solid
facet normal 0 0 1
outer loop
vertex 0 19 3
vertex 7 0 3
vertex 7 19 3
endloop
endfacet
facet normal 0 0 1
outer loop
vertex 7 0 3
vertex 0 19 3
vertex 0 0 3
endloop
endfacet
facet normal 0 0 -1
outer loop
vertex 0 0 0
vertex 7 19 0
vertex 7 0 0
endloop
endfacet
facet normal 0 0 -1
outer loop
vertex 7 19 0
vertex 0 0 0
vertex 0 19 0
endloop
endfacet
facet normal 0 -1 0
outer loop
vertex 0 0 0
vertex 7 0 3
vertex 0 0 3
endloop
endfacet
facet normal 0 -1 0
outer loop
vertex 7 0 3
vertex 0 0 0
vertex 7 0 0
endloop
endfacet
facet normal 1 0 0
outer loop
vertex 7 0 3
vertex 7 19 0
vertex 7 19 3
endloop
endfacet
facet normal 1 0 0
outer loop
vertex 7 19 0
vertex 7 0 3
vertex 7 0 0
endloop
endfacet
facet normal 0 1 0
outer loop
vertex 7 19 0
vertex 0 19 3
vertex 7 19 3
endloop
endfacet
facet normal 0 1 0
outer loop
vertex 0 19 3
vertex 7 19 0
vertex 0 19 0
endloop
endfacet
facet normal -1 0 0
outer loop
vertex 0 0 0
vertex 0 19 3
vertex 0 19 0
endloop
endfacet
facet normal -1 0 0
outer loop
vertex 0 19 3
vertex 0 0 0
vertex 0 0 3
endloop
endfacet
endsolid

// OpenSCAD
// Generated by SolidPython 1.0.1 on 2020-07-29 00:46:55


cube(size = [7, 19, 3]);
/***********************************************
*********      SolidPython code:      **********
************************************************
 
# import packages: SolidPython
from solid import *
from solid.utils import *
from itertools import chain, combinations, permutations


class Resize:

    def __init__(self, scad_file):
        self.scad_file = scad_file
        #self.scad_file = import_scad(scad_file)
        # cone/cylinder param:
        self.r1 = 0
        self.r2 = 0
        self.h = 0
        # rectangular prism param:
        self.w = 0
        self.l = 0
        # ellipse param:
        self.r = 0

    # import OpenScad code (file name corresponds to shape)


    # classify shape + parameters
    def assign(self, param1, param2, param3):
        if self.scad_file == 'cone.scad':
            self.r1 = param1
            self.r2 = param2
            self.h = param3
        elif self.scad_file == 'cylinder.scad':
            self.r1 = param1
            self.r2 = param2
            self.h = param3
        elif self.scad_file == 'rectangularPrism.scad':
            self.h = param1
            self.l = param2
            self.w = param3
        else:
            self.r = param1
            self.h = param2

    # resize parameters
    def iterate(self):
        x = range(3, 20, 2)
        i = 1
        if self.scad_file == 'cone.scad':
            tempList = list(permutations(x, 2))
            for temp in tempList:
                param1 = temp[0]
                param2 = temp[1]
                filepath = 'produced_scad_files/' + 'cone' + str(param1) + '_' + str(param2) + '_' + '.scad'
                scad_render_to_file(cylinder(h=param1, r1=param2, r2=0), filepath)

        elif self.scad_file == 'cylinder.scad':
            tempList = list(permutations(x, 3))
            for temp in tempList:
                param1 = temp[0]
                param2 = temp[1]
                filepath = 'produced_scad_files/' + 'cylinder' + str(param1) + '_' + str(param2) + '_' + '.scad'
                scad_render_to_file(cylinder(h=param1, r1=param2, r2=param2), filepath)

        elif self.scad_file == 'rectangularPrism.scad':
            tempList = list(permutations(x, 3))
            for temp in tempList:
                param1 = temp[0]
                param2 = temp[1]
                param3 = temp[2]
                filepath = 'produced_scad_files/' + 'rectangularPrism' + str(param1) + '_' + str(param2) + '_' + str(
                    param3) + '.scad'
                scad_render_to_file(cube(size=(param1, param2, param3)), filepath)

        elif self.scad_file == 'ellipse.scad':
            tempList = list(permutations(x, 4))
            for temp in tempList:
                param1 = temp[0]
                param2 = temp[1]
                param3 = temp[2]
                param4 = temp[3]
                filepath = 'produced_scad_files/' + 'ellipse' + str(param1) + '_' + str(param2) + '_' + str(param3) + '_' + str(param4) + '.scad'
                scad_render_to_file(scale([param1, param2, param3])(sphere(r=param4)), filepath)

    def render_to_scadfile(self):
        scad_render_to_file(scad, 'example.scad') 
 
************************************************/
